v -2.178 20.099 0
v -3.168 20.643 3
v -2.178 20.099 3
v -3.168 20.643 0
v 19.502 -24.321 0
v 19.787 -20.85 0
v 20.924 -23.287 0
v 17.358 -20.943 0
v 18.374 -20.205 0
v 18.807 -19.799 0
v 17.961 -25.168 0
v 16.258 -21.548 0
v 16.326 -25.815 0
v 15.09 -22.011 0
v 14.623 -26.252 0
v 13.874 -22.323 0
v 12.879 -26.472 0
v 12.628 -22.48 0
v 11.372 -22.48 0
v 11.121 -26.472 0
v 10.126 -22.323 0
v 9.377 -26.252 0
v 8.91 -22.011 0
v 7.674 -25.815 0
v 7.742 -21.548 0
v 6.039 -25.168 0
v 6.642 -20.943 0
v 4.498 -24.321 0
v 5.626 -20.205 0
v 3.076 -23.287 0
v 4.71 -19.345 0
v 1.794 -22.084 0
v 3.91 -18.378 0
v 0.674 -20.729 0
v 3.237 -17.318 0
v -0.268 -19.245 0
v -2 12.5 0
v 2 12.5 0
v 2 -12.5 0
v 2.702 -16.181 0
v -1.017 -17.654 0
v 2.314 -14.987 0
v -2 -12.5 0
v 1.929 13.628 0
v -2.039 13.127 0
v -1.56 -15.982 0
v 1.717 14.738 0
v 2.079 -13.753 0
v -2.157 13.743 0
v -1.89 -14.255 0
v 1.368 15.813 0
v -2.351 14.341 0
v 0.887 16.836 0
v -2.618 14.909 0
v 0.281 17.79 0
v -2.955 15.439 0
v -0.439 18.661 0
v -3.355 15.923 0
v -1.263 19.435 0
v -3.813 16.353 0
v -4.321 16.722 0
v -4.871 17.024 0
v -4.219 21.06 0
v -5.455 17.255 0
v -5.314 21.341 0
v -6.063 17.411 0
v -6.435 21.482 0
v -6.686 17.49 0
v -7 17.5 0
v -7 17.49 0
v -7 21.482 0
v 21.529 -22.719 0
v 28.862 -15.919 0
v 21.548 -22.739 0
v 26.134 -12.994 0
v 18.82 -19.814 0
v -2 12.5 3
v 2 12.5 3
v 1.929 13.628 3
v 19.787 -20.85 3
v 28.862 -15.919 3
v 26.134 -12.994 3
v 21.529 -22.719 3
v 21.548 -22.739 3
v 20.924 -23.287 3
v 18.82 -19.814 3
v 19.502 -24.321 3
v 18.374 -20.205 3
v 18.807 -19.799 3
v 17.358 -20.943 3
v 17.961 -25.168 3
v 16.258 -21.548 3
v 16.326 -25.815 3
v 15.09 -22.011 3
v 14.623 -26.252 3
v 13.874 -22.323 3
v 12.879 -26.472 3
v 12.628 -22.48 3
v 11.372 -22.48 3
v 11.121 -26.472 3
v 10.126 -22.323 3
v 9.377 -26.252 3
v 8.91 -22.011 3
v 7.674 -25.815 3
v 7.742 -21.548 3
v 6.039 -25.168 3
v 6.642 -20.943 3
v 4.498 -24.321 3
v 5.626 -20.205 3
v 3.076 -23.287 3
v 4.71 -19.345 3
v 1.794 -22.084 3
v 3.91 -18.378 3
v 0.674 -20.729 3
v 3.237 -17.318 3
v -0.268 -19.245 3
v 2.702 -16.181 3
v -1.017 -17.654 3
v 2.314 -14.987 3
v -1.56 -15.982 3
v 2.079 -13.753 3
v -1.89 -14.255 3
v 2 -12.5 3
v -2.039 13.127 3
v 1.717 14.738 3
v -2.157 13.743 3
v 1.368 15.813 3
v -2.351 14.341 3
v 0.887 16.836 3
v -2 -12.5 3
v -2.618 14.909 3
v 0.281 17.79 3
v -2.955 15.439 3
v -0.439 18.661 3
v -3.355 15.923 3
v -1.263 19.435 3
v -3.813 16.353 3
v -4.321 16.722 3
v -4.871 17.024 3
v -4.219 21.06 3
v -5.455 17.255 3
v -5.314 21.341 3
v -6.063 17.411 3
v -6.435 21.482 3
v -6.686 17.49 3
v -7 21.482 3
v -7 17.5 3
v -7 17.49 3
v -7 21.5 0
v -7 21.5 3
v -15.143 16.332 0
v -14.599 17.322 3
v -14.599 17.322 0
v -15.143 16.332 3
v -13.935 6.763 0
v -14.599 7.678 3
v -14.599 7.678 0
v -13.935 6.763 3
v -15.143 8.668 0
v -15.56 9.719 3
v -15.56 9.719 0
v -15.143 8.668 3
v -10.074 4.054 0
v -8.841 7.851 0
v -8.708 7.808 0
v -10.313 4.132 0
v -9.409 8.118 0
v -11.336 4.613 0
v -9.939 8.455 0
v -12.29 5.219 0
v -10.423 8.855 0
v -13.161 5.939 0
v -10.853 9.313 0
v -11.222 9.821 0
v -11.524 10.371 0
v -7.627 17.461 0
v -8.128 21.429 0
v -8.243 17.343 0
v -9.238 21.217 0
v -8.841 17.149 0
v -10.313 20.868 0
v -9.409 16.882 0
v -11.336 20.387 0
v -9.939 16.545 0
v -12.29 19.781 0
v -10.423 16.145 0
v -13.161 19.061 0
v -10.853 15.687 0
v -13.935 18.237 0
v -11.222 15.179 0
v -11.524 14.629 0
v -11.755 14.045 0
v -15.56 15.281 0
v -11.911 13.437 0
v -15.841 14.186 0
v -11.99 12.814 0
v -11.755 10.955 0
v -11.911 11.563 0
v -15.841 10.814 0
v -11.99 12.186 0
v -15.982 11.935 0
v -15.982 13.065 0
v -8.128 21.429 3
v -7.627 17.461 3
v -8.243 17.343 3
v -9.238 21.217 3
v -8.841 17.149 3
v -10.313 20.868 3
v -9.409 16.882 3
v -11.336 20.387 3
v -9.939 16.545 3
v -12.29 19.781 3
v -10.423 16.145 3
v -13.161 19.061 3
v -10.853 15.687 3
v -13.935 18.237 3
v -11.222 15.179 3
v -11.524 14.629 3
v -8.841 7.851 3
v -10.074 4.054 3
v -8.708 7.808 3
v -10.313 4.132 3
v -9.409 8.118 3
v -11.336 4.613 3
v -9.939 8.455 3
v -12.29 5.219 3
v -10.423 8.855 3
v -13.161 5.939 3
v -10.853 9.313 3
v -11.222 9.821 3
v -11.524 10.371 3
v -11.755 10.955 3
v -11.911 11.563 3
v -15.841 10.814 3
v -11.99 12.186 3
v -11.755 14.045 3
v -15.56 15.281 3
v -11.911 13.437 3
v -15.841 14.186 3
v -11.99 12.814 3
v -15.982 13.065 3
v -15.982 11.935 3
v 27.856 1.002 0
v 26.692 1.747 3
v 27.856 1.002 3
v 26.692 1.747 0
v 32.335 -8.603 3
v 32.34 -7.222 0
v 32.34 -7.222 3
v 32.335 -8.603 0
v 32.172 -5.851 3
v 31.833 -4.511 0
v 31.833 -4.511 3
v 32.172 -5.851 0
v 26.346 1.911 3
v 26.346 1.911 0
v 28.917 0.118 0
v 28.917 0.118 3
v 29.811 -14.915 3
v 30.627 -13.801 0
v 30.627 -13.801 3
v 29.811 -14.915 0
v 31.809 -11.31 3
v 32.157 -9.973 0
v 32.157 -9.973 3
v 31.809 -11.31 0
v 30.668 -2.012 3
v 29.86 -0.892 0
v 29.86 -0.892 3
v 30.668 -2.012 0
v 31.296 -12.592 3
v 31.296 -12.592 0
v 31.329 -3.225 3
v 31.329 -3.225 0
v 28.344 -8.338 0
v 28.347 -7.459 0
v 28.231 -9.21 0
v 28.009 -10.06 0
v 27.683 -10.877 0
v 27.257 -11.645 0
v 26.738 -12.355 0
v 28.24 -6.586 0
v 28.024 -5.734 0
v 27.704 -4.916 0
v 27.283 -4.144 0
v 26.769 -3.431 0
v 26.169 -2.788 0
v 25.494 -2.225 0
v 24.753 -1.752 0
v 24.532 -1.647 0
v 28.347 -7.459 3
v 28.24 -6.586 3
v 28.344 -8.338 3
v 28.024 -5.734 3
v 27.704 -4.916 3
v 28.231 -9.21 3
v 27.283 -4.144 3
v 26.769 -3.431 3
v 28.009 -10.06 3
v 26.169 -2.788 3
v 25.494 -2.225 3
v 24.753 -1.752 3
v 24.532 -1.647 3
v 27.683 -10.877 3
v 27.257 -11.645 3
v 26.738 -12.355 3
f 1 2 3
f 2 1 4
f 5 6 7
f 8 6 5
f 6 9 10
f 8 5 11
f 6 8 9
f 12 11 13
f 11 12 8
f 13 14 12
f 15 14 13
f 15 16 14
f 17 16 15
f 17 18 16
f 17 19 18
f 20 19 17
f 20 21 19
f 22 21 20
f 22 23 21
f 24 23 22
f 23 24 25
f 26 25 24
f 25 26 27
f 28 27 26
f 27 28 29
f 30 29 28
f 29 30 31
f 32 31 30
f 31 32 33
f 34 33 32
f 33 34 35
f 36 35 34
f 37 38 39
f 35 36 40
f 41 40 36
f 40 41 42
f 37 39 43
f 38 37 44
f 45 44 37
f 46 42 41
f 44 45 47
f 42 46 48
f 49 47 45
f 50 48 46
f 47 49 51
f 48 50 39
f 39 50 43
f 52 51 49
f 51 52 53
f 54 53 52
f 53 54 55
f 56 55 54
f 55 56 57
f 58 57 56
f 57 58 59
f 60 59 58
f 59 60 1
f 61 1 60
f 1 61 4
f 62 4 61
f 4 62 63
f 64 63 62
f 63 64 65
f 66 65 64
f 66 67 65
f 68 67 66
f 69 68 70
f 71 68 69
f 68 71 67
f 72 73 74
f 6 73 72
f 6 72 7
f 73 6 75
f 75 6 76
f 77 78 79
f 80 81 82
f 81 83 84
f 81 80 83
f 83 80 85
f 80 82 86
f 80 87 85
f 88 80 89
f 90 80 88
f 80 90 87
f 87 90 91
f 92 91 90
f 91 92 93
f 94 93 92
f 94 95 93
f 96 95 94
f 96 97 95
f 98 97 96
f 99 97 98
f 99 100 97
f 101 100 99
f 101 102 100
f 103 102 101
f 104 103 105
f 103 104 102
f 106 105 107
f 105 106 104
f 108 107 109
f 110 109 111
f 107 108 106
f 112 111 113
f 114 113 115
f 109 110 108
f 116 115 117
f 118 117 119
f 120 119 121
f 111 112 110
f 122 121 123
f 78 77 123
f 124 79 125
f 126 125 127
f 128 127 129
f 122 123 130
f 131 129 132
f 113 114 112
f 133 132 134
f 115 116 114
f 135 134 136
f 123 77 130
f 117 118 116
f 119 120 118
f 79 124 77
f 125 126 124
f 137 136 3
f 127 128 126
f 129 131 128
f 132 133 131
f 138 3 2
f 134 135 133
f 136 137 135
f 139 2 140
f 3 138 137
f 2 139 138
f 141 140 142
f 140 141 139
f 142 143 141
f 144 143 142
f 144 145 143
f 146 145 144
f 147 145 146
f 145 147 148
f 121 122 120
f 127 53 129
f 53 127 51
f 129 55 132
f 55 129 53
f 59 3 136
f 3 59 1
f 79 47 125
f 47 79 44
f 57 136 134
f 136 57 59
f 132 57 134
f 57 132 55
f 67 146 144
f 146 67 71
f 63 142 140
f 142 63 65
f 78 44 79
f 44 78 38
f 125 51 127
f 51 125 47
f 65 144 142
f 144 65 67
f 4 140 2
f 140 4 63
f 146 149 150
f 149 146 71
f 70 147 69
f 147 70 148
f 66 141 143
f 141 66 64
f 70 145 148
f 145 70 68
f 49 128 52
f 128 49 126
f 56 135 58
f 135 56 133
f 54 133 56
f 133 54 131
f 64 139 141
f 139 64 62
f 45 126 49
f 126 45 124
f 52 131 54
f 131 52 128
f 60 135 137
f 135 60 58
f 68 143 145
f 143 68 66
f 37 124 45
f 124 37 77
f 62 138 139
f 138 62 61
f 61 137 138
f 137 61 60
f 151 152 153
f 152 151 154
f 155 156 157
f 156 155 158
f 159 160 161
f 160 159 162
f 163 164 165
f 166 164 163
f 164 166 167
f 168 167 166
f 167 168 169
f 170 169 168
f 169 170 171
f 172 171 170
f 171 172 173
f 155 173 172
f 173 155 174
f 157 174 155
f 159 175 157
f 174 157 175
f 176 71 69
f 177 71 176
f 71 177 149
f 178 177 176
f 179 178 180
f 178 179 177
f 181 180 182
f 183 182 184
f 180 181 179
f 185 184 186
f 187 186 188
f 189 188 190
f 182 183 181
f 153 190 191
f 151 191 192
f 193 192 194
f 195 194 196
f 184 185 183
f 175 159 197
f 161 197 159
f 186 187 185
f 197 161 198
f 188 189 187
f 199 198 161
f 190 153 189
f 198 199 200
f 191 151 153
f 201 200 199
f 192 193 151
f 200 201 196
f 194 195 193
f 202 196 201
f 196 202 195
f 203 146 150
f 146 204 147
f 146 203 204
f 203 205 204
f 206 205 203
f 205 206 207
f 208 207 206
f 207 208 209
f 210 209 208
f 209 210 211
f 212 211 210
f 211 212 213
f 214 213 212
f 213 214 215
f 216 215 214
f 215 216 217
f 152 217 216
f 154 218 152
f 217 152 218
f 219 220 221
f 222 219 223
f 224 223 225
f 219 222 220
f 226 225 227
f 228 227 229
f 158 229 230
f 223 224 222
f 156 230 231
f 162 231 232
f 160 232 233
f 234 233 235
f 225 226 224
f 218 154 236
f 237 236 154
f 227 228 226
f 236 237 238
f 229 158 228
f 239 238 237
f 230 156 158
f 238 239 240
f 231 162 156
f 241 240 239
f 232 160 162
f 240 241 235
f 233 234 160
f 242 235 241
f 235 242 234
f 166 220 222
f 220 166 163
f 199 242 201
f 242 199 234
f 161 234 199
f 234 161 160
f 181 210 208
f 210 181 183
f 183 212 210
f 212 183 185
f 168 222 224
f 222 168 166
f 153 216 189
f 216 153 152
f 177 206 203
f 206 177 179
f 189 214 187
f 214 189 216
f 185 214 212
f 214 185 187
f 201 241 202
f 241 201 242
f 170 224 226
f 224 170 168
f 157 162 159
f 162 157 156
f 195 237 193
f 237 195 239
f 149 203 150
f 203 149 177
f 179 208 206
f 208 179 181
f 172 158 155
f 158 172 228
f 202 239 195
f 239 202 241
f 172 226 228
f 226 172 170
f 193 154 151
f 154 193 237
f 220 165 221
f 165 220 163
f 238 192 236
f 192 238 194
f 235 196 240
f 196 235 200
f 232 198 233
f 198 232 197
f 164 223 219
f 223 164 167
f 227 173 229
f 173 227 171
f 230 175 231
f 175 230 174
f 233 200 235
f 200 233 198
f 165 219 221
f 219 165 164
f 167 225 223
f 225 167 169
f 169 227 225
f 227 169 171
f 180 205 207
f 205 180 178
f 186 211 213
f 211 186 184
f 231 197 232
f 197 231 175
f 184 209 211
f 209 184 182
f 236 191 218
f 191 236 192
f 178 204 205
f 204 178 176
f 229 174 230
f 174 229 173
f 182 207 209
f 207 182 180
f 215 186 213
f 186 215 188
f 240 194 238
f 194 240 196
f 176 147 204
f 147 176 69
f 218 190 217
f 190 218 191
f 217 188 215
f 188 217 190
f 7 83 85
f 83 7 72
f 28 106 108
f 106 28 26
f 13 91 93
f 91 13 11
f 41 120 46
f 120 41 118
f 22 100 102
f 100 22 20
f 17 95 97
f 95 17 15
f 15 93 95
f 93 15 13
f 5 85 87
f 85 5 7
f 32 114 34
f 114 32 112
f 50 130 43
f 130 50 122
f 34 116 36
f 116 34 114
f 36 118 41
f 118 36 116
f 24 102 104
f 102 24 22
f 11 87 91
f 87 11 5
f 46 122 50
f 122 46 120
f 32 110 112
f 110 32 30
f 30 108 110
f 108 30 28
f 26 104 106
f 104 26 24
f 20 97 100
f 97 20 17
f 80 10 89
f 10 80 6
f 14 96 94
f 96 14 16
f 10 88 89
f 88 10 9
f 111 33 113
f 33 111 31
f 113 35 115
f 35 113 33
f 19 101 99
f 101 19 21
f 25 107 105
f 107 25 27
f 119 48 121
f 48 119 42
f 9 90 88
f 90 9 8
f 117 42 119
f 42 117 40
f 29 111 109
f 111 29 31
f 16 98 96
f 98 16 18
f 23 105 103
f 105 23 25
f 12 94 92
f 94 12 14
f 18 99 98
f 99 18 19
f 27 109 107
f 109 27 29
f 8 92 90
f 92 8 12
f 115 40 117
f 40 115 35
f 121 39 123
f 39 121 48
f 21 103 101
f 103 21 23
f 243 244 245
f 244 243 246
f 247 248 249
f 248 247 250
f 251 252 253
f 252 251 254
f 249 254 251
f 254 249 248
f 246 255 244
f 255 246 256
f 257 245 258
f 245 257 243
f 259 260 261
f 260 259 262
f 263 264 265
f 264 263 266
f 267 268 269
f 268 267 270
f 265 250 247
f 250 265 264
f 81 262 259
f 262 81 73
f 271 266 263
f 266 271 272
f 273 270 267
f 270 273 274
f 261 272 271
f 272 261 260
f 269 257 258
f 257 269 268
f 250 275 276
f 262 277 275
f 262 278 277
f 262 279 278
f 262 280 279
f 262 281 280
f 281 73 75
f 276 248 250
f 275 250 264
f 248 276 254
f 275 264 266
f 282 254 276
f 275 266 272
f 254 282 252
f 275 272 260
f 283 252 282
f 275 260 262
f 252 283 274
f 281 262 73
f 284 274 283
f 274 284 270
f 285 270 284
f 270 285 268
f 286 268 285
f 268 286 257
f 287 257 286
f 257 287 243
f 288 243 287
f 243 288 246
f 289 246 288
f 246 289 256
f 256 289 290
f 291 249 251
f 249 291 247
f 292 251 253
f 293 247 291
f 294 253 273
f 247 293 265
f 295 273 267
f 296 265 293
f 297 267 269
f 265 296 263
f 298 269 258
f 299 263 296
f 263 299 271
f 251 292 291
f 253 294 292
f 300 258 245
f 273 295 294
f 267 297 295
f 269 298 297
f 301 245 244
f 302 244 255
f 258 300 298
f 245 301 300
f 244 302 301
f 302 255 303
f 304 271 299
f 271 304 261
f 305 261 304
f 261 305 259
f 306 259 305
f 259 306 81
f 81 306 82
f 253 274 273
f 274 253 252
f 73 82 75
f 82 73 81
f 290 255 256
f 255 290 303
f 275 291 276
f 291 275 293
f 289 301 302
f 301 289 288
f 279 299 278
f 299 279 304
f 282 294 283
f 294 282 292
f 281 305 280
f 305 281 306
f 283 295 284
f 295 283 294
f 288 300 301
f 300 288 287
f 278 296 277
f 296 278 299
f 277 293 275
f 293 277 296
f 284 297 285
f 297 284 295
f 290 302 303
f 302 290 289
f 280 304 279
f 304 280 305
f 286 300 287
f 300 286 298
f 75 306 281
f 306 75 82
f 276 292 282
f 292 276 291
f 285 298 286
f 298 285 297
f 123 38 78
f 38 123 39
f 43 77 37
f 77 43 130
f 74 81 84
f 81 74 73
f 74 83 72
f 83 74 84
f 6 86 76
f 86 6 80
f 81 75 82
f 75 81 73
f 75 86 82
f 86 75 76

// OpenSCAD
//Title: Universal Hook
//Author: Kevin Lin
//Date: 2016-9-18
//License: Creative Commons - Share Alike - Attribution

//Usage: Alter parameters based on measurement of items. Hook is divided into 3 sections: top, center, bottom. Top and bottom both include 2 curved sections (inner and outer), which have variables responsible for altering angle and radius of the curve. Credits to Alex English for his Wedge module.

//Number of facets used to generate an arc
$fn = 50;

//////////////////////////////////PARAMETERS/////////////////////////////////////

//GLOBAL

//Global Extrusion height
hook_thickness = 3;
//Global Hook Width
hook_width = 4;

//TOP

//top inner curve radius
top_inner_radius = 5;
//top inner curve angle
top_inner_angle = 90;

//top outer curve radius
top_outer_radius = 5;
//top outer curve angle
top_outer_angle = 160;

//top bar length
top_length = 0;


//CENTER

//center bar length
center_length = 25;


//BOTTOM

//bottom inner curve radius
bottom_inner_radius = 10;
//bottom inner curve angle
bottom_inner_angle = 133;

//bottom outer curve radius
bottom_outer_radius = 7;
//bottom outer curve angle
bottom_outer_angle = 110;

//bottom bar length
bottom_length = 10;


//////////////////////Wedge Module from Alex English/////////////////////////////

//Title: Wedge Module
//Author: Alex English - ProtoParadigm
//Date: 1/4/2013
//License: Creative Commons - Share Alike - Attribution

//Usage: Include in your other .scad projects and call wedge with arguments for the height of the wedge, the radius of the wedge, and the angle of the wedge in degrees.  The resulting wedge will be placed with the point at the origin, extending into the z axis, with the angle starting at the x axis and extending counter-clockwise as per the right-hand rule.

//Updated: 1/12/2013 - Increased dimensions of wedge to be revoved when angle is more than 180 as per suggestion from kitwallace.

module wedge_180(h, r, d)
{
	rotate(d) difference()
	{
		rotate(180-d) difference()
		{
			cylinder(h = h, r = r);
			translate([-(r+1), 0, -1]) cube([r*2+2, r+1, h+2]);
		}
		translate([-(r+1), 0, -1]) cube([r*2+2, r+1, h+2]);
	}
}

module wedge(h, r, d)
{
	if(d <= 180)
		wedge_180(h, r, d);
	else
		rotate(d) difference()
		{
			cylinder(h = h, r = r);
			translate([0, 0, -1]) wedge_180(h+2, r+1, 360-d);
		}
}

//Example: wedge(10, 20, 145); //would create a wedge 10 high, with a radius of 20, and an angle of 33 degrees.


///////////////////////////////////////////////////////////////////////////////////


module curved_section(thickness, width, radius, angle) {
    translate([-radius-width/2,0,0])
    difference() {
        wedge(thickness,radius+width,angle);
        translate([0,0,0])wedge(thickness,radius,angle);
    }
}


//Top inner curve
rotate([0,0,0]) translate([0,center_length/2])
curved_section(hook_thickness,hook_width,top_inner_radius,top_inner_angle);

//Top bar
translate([-top_inner_radius-hook_width/2-sin(top_inner_angle-90)*top_inner_radius,center_length/2+sin(top_inner_angle)*top_inner_radius,0]) rotate([0,0,top_inner_angle])
cube([hook_width,top_length,hook_thickness]);


//Top outer curve
translate([-top_inner_radius-hook_width/2-sin(top_inner_angle-90)*top_inner_radius-sin(top_inner_angle)*top_length, center_length/2+sin(top_inner_angle)*top_inner_radius-sin(top_inner_angle-90)*top_length,
            0]) 

rotate([0,0,top_inner_angle]) 

translate([hook_width/2,0])
curved_section(hook_thickness,hook_width,top_outer_radius,top_outer_angle);


//Center bar
translate([0,0,hook_thickness/2])cube([hook_width,center_length,hook_thickness],center=true);


//Bottom inner curve
translate([0,-center_length/2]) rotate([0,0,180]) 
curved_section(hook_thickness,hook_width,bottom_inner_radius,bottom_inner_angle);

//Bottom bar
translate([bottom_inner_radius+hook_width/2+sin(bottom_inner_angle-90)*bottom_inner_radius,-center_length/2-sin(bottom_inner_angle)*bottom_inner_radius,0]) rotate([0,0,bottom_inner_angle]) 
translate([-hook_width,-bottom_length,0])
cube([hook_width,bottom_length,hook_thickness]);



//Bottom outer curve
translate([bottom_inner_radius+hook_width/2+sin(bottom_inner_angle-90)*bottom_inner_radius,-center_length/2-sin(bottom_inner_angle)*bottom_inner_radius,0]) rotate([0,0,bottom_inner_angle]) 
translate([-hook_width/2,-bottom_length,0])
rotate([0,0,180]) 
curved_section(hook_thickness,hook_width,bottom_outer_radius,bottom_outer_angle);
